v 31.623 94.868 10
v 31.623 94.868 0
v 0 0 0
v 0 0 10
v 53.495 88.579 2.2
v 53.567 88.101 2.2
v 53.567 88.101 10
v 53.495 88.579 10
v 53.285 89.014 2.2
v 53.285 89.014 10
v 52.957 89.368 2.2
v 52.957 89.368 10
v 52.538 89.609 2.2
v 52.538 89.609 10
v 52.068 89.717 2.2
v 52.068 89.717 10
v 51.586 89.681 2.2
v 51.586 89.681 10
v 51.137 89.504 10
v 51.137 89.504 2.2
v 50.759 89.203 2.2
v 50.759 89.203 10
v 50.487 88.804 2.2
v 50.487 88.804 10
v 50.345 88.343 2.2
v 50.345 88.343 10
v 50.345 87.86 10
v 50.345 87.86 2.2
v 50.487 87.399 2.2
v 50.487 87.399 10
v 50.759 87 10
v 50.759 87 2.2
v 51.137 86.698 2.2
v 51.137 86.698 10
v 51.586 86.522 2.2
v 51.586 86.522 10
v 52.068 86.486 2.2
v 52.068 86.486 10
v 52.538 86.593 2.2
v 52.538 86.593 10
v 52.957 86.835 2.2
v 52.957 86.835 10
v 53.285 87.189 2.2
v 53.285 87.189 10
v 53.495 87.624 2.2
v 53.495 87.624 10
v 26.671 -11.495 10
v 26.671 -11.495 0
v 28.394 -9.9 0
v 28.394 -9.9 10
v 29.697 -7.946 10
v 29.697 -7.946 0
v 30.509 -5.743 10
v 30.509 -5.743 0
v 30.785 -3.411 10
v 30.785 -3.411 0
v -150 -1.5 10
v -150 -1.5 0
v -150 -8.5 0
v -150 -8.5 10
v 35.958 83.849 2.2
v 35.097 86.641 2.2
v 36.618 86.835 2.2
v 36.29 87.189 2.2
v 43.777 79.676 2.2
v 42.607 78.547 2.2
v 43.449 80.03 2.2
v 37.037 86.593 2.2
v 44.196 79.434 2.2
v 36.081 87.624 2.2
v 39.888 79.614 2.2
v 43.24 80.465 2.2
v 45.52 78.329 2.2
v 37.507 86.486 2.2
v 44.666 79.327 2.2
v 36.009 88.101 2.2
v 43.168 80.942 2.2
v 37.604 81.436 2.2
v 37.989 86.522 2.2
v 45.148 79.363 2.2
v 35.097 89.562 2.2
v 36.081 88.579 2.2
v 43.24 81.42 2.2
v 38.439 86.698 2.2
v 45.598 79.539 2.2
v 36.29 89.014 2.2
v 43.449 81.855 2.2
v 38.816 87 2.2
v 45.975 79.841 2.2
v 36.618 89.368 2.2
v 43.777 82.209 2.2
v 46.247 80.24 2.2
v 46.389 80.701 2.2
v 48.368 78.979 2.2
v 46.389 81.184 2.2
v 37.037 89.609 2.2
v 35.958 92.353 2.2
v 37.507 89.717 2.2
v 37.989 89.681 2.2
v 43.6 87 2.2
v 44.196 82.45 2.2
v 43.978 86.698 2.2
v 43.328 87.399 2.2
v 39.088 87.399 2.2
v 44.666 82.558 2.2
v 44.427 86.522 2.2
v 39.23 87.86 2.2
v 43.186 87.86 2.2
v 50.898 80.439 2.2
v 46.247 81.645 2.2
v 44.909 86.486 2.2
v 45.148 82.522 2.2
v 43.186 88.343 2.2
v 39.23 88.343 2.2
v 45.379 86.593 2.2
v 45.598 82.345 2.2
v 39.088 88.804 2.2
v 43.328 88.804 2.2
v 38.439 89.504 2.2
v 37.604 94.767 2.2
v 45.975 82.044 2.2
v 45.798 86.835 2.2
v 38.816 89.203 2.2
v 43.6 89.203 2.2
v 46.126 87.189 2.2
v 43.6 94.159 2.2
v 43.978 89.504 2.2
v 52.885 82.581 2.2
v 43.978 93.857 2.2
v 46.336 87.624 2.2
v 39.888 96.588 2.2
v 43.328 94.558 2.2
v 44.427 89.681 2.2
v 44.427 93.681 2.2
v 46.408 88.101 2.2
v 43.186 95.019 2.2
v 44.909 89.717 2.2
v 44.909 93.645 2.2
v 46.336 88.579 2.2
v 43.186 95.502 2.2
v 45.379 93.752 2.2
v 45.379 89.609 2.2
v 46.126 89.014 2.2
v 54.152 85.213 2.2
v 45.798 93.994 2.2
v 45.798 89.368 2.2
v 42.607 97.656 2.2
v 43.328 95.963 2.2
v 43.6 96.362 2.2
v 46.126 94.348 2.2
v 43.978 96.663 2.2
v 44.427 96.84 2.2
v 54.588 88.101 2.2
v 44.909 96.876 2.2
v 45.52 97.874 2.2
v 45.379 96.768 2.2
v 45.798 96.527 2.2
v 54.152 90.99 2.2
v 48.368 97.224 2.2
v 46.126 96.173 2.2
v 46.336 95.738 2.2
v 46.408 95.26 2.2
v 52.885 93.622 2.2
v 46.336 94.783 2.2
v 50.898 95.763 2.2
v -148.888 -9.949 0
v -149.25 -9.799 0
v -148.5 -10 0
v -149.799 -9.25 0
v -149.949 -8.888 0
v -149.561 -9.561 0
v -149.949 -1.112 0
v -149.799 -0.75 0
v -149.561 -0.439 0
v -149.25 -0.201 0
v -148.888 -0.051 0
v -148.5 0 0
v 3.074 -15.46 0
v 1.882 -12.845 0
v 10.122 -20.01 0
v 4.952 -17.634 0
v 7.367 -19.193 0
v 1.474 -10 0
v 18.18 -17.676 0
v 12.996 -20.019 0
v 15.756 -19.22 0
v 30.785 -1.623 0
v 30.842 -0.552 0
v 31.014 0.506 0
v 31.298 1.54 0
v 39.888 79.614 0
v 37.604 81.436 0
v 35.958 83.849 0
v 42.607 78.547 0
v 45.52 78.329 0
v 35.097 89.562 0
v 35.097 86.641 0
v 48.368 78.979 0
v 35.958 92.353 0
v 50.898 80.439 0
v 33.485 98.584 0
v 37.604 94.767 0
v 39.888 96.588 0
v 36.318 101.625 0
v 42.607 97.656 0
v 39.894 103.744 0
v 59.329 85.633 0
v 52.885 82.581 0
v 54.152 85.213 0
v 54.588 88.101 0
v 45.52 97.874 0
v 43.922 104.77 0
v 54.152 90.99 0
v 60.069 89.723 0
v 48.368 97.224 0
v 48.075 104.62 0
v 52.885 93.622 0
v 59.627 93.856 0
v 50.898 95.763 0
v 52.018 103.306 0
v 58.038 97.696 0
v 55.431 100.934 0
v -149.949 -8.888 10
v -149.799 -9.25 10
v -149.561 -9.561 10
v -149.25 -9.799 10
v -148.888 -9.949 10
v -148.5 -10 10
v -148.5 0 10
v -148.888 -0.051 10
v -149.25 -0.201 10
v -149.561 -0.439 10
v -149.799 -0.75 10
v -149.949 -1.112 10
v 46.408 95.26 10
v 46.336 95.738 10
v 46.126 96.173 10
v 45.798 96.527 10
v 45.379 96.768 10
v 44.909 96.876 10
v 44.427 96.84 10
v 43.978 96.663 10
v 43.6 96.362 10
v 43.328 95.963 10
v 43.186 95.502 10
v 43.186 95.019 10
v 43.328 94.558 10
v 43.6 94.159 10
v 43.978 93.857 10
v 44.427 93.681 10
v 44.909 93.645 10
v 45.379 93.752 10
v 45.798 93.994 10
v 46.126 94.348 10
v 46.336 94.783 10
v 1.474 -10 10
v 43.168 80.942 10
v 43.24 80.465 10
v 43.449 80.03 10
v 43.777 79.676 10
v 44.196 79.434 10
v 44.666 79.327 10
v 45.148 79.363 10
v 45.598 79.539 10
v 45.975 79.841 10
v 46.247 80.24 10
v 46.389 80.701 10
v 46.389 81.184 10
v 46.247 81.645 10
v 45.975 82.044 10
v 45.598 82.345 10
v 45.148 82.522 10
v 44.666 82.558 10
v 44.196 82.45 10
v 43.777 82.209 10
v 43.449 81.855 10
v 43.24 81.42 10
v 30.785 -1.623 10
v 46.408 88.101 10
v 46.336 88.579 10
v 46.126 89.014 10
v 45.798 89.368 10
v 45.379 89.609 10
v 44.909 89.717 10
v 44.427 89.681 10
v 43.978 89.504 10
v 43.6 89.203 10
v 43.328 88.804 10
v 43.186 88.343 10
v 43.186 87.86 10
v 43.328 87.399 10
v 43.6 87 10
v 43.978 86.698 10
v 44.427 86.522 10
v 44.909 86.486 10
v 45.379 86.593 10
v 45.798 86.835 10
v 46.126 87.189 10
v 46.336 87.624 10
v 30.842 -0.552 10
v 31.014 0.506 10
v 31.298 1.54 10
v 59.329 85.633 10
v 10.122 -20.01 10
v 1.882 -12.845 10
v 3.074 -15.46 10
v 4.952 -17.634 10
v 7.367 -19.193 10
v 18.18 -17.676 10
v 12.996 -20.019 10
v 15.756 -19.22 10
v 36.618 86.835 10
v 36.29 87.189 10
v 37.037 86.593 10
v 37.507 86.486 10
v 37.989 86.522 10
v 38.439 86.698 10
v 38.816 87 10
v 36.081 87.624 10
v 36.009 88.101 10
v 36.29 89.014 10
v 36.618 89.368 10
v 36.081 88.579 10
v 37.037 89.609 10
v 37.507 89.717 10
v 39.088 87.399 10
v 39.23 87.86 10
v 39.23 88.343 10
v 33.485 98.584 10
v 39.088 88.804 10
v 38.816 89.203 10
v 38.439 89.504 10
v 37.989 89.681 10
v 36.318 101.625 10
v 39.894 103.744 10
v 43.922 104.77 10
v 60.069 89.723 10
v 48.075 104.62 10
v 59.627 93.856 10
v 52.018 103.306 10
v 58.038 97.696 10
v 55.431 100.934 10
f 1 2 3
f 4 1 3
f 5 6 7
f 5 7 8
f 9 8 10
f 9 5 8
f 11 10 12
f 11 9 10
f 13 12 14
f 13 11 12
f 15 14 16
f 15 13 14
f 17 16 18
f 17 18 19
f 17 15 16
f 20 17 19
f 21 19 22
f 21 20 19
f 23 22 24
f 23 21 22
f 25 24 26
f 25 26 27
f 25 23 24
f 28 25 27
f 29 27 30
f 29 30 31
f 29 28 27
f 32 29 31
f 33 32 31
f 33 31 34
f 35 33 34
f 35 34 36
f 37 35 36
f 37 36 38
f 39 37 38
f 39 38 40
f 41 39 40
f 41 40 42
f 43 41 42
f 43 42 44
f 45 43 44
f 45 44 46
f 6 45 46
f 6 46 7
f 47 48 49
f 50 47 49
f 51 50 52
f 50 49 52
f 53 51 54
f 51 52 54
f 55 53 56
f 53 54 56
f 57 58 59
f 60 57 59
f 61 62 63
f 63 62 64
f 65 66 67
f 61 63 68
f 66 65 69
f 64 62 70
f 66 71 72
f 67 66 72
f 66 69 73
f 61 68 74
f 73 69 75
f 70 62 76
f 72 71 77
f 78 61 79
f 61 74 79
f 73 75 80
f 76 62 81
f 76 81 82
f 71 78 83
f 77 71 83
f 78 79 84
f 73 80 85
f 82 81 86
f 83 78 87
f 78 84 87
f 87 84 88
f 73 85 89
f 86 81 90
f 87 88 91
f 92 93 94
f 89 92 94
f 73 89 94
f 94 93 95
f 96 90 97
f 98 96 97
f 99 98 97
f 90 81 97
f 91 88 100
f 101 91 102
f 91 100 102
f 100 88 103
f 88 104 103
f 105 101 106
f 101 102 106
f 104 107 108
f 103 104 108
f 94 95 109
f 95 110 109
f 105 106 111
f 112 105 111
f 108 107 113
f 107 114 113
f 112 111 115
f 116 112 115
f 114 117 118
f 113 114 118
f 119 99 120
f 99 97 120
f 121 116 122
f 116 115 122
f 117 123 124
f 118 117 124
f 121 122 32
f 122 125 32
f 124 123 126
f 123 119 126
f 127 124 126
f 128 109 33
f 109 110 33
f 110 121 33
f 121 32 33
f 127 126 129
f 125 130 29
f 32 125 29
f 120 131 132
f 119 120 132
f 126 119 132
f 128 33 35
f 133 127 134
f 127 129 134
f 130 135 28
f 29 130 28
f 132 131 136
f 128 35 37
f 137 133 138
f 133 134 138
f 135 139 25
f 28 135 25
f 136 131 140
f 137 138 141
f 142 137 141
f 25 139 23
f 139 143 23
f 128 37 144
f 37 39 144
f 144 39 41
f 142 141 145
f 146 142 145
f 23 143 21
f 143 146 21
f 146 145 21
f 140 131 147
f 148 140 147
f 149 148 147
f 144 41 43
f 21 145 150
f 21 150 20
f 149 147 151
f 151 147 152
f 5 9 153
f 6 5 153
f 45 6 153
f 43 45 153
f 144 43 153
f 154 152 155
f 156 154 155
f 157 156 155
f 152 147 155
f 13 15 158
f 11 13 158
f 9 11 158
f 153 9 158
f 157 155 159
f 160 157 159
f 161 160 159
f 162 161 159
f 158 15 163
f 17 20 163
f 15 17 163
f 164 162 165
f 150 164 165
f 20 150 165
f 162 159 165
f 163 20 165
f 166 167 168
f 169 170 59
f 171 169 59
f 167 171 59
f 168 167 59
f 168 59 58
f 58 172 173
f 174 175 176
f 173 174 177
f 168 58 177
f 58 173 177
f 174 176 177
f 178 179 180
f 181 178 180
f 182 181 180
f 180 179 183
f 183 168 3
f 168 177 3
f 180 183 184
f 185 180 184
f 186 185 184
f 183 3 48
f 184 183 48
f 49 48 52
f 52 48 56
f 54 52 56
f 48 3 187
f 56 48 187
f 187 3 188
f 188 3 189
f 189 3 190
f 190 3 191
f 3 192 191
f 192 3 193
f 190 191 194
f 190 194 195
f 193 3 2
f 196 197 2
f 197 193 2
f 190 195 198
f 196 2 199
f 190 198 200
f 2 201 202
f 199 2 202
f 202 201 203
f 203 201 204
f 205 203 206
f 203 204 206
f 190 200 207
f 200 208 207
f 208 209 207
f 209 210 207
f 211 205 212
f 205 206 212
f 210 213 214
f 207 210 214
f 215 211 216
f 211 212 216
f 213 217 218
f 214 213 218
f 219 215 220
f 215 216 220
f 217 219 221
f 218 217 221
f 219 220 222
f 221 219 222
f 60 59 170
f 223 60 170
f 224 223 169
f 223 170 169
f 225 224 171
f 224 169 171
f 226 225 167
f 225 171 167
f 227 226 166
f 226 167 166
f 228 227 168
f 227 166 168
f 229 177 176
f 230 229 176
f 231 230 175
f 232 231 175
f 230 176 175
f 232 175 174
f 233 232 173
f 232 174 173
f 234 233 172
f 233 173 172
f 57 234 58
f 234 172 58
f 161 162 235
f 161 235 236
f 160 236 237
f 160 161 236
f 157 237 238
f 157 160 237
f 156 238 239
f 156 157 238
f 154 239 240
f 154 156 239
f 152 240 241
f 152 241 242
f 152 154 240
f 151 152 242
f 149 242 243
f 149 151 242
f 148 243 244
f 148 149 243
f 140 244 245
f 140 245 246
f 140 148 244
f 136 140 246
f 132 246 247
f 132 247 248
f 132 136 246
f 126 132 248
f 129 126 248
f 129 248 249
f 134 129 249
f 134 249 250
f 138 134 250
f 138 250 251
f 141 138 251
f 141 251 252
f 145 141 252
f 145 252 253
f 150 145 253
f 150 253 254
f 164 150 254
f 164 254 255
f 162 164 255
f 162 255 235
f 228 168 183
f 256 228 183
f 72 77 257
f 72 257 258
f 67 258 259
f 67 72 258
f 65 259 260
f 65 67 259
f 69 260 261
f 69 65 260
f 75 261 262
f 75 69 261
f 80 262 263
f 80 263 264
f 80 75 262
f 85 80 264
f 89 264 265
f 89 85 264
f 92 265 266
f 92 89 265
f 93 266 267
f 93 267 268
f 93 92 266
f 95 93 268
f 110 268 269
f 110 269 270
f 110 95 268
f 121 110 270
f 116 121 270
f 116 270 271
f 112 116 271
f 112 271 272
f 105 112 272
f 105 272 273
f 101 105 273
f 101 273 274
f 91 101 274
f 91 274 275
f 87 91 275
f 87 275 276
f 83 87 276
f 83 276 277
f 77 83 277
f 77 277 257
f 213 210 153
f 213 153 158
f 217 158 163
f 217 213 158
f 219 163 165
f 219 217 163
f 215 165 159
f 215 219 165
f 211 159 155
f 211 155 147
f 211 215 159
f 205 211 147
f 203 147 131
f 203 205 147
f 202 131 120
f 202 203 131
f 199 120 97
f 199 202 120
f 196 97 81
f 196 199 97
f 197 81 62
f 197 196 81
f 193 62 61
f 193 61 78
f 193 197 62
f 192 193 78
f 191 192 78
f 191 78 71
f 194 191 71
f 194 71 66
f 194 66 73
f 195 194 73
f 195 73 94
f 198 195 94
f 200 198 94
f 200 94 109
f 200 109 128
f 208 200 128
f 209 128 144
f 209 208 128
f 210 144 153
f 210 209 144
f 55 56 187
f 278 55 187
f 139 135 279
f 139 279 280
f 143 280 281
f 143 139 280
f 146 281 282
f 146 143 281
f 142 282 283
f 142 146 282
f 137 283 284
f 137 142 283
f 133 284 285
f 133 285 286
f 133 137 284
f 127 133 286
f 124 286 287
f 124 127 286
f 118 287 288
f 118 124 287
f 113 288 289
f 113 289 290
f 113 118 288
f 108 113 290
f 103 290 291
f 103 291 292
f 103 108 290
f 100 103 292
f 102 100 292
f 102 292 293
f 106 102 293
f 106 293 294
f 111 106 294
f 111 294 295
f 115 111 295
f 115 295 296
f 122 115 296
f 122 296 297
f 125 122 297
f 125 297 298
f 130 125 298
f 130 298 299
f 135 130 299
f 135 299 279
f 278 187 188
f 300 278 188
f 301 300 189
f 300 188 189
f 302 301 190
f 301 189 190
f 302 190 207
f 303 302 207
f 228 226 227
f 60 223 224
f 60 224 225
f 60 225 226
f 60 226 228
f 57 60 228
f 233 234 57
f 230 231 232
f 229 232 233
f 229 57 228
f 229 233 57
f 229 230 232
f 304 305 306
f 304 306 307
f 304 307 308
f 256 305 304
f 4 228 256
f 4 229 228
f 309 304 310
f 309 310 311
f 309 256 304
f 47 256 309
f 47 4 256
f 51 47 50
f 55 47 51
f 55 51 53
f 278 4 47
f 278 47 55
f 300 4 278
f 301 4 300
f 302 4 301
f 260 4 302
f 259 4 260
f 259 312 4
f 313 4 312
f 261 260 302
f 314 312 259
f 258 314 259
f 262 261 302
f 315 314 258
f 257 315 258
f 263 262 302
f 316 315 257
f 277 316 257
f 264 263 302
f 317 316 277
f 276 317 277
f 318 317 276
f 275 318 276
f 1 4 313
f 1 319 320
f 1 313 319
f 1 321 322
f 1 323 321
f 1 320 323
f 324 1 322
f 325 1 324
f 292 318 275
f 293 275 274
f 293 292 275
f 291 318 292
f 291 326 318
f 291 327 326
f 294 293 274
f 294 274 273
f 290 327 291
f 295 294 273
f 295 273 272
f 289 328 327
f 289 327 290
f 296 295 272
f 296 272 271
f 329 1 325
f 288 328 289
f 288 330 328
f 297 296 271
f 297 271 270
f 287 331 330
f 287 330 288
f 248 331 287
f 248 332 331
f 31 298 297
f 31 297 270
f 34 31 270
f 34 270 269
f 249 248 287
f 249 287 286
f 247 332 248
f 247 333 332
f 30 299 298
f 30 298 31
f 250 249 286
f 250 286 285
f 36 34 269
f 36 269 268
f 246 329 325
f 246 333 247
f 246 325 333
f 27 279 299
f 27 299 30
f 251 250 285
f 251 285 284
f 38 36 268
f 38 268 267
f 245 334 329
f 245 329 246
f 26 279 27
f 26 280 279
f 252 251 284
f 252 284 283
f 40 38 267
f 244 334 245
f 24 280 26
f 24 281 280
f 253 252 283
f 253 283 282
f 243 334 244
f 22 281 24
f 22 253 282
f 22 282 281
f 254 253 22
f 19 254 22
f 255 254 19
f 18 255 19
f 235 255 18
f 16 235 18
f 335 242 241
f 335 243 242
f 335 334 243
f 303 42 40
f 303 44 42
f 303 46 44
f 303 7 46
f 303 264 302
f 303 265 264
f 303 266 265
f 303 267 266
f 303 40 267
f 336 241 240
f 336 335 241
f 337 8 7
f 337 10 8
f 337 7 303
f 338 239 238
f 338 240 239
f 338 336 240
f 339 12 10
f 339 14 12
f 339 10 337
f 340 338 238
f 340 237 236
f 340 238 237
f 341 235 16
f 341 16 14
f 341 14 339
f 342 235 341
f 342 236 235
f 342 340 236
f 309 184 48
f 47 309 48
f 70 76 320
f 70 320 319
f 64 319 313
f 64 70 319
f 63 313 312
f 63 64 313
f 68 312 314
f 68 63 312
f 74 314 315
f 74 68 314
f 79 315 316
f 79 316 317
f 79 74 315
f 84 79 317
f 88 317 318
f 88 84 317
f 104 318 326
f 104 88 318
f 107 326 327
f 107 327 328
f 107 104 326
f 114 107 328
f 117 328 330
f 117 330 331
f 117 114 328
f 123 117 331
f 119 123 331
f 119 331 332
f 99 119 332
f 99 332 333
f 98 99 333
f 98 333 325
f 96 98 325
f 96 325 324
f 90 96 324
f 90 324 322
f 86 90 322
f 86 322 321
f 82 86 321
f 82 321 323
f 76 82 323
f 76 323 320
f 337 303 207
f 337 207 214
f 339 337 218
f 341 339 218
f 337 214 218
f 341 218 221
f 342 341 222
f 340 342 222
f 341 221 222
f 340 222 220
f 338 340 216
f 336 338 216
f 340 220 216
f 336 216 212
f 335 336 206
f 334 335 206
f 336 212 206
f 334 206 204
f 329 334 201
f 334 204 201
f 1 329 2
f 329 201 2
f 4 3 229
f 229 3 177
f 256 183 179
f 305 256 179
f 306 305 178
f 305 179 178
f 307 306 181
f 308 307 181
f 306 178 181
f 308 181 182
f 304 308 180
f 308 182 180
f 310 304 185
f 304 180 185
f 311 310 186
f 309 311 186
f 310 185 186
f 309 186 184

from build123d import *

# Parameters (mm, degrees)
EXTRUDE_1_DEPTH     = 10
SKETCH_1_15_R       = 1.62
CUT_EXTRUDE_2_DEPTH = 10
SKETCH_1_16_R       = 9.8
CUT_EXTRUDE_3_DEPTH = 2.2


with BuildPart() as part:
    # 草图1 → 凸台-拉伸1 (new body)
    with BuildSketch(Plane.XY):
        with BuildLine():
            Line((-150, -1.5), (-150, -8.5))
            ThreePointArc((-150, -8.5), (-149.560660172, -9.560660172), (-148.5, -10))
            Line((-148.5, -10), (1.474010293, -10))
            ThreePointArc((1.474010293, -10), (7.366779588, -19.192759664), (18.180300258, -17.676405182))
            Line((18.180300258, -17.676405182), (26.670550932, -11.495316766))
            ThreePointArc((26.670550932, -11.495316766), (29.697133836, -7.946431766), (30.784873277, -3.410837899))
            Line((30.784873277, -3.410837899), (30.784873277, -1.622776602))
            ThreePointArc((30.784873277, -1.622776602), (30.9139987, -0.020954172), (31.298040296, 1.539501058))
            Line((31.298040296, 1.539501058), (59.329162551, 85.632867822))
            ThreePointArc((59.329162551, 85.632867822), (50.093700568, 104.103791788), (31.622776602, 94.868329805))
            Line((31.622776602, 94.868329805), (0, 0))
            Line((0, 0), (-148.5, 0))
            ThreePointArc((-148.5, 0), (-149.560660172, -0.439339828), (-150, -1.5))
        make_face()
    extrude(amount=EXTRUDE_1_DEPTH)

    # 草图1<15> → 切除-拉伸2 (cut)
    with BuildSketch(Plane.XY):
        with Locations((44.787529943, 88.101420291)):
            Circle(SKETCH_1_15_R)
        with Locations((51.946529943, 88.101420291)):
            Circle(SKETCH_1_15_R)
        with Locations((44.787529943, 95.260420291)):
            Circle(SKETCH_1_15_R)
        with Locations((44.787529943, 80.942420291)):
            Circle(SKETCH_1_15_R)
        with Locations((37.628529943, 88.101420291)):
            Circle(SKETCH_1_15_R)
    extrude(amount=CUT_EXTRUDE_2_DEPTH, mode=Mode.SUBTRACT)

    # 草图1<16> → 切除-拉伸3 (cut)
    with BuildSketch(Plane.XY):
        with Locations((44.787529943, 88.101420291)):
            Circle(SKETCH_1_16_R)
    extrude(amount=CUT_EXTRUDE_3_DEPTH, mode=Mode.SUBTRACT)


solid = part.part
